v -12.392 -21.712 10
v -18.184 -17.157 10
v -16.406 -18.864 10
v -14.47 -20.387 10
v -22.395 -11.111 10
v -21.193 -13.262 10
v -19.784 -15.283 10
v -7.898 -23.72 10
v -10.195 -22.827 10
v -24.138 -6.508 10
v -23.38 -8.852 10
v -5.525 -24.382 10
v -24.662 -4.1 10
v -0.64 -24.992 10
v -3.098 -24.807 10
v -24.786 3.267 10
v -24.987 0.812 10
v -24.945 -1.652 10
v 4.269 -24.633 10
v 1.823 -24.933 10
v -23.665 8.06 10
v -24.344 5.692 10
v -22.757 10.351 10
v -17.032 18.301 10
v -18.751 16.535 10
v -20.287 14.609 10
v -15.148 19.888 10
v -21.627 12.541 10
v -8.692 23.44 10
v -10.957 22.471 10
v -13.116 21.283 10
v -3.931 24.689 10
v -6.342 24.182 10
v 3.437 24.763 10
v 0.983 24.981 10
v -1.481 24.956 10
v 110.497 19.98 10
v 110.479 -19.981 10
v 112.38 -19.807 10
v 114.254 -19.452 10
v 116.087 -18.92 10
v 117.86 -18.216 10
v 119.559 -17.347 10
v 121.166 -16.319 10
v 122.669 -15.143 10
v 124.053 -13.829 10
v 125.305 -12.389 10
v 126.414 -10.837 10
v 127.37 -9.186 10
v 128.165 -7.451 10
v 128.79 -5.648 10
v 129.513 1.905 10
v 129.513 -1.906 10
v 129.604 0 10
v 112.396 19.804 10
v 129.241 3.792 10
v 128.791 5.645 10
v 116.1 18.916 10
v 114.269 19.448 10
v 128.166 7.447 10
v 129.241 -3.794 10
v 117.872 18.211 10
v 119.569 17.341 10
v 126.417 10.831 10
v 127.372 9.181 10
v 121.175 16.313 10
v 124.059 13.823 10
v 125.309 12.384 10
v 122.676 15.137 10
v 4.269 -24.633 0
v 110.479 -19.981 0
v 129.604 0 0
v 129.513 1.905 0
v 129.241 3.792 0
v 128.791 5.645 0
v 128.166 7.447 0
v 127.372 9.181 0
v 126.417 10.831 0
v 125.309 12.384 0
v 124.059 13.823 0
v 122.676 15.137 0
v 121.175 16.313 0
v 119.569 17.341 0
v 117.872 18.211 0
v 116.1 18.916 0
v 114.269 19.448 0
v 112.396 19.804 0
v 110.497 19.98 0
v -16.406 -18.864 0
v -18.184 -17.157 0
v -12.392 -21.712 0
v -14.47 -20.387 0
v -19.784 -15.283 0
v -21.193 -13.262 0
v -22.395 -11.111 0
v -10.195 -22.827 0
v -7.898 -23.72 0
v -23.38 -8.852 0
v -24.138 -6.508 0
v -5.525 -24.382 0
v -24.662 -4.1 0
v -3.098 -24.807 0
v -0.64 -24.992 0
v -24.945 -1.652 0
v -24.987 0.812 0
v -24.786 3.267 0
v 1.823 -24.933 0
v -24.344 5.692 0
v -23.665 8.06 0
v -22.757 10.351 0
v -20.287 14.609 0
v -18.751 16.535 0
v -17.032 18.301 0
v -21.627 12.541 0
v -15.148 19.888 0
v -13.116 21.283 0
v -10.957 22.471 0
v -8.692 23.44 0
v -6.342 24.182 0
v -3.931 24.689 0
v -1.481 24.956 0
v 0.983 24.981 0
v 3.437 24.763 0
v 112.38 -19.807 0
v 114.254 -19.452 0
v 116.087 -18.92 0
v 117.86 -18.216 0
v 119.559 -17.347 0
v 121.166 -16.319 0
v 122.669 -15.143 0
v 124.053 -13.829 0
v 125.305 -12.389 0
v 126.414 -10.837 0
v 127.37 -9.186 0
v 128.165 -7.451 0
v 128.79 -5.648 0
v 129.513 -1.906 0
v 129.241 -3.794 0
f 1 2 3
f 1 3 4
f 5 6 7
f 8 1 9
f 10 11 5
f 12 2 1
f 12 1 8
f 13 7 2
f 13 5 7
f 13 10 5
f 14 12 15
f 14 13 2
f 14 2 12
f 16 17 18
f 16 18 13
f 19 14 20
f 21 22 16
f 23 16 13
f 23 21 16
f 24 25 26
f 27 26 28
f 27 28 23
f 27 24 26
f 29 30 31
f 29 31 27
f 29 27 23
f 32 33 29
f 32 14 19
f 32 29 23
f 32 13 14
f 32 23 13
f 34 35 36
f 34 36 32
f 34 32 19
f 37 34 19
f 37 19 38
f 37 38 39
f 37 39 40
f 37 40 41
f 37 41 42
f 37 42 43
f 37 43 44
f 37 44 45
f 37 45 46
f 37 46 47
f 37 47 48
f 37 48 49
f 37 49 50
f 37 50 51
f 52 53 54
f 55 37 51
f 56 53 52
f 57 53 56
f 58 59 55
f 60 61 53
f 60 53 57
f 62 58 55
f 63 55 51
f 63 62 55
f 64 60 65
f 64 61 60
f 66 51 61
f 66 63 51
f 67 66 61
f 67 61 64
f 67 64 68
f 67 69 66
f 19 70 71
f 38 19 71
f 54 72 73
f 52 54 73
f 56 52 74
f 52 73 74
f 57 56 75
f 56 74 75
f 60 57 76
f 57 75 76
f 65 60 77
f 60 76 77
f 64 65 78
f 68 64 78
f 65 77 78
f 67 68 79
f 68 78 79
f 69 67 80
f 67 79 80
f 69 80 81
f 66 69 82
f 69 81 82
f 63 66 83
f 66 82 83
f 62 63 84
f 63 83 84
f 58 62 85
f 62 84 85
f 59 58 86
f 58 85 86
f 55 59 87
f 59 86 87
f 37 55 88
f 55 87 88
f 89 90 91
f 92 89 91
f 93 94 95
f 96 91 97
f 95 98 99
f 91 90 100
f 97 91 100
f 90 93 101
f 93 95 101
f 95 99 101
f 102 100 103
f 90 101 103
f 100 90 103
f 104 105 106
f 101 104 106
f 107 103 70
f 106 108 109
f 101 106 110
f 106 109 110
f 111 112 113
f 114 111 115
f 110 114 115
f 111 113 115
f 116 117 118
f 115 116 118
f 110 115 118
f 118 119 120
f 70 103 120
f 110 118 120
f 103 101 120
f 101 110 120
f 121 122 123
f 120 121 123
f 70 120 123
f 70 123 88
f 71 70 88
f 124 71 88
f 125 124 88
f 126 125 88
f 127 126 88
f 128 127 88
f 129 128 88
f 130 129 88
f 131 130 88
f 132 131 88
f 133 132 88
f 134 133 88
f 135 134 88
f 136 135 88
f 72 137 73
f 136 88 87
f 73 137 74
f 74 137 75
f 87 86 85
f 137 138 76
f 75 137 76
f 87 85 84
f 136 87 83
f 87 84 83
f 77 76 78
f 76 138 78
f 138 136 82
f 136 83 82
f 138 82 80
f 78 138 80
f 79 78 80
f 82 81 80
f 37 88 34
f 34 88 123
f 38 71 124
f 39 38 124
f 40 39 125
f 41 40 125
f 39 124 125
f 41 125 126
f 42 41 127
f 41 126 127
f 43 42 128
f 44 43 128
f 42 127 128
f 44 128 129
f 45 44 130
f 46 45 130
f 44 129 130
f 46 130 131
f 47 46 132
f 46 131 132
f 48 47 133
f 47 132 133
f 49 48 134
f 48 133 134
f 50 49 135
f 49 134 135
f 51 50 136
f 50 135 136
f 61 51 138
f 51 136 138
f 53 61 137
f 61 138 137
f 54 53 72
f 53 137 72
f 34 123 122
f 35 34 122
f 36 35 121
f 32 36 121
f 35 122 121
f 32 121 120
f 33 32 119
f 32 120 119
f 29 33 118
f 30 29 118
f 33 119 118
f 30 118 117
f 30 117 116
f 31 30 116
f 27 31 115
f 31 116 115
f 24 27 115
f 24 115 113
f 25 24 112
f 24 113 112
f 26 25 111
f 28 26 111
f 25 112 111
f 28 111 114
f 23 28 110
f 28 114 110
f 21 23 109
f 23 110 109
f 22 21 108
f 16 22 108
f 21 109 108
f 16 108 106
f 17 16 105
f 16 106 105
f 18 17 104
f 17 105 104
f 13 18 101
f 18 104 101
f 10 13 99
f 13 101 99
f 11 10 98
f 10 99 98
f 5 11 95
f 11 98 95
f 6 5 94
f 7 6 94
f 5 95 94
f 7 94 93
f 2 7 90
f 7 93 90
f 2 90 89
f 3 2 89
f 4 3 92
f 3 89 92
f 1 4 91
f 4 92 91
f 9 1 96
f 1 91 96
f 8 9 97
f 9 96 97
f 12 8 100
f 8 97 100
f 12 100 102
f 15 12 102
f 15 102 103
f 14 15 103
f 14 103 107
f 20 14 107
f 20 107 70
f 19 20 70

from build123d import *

# Parameters (mm, degrees)
F1_DEPTH = 10


# Not quite as in the source:
# - the program builds the solid bodies; features that only make, move or delete a surface that nothing else refers to are left out


with BuildPart() as f1:
    # F0 (on Top) → F1 (new body)
    with BuildSketch(Plane.XY):
        with BuildLine():
            ThreePointArc((4.2686762947, -24.6328724003), (19.1274267397, -16.0978739688), (25, 0))
            ThreePointArc((25, 0), (18.8537485405, 16.4175566383), (3.4371067222, 24.7625987606))
            ThreePointArc((3.4371067222, 24.7625987606), (-24.9964580647, -0.42081376), (4.2686762947, -24.6328724003))
        make_face()
        with BuildLine():
            ThreePointArc((110.4968080295, 19.9800743296), (95.7812936366, 14.4542523825), (89.6042668357, 0))
            ThreePointArc((89.6042668357, 0), (95.7750082208, -14.4482388602), (110.4794274519, -19.9808431728))
            ThreePointArc((110.4794274519, -19.9808431728), (124.0525056959, -13.8292586149), (129.6042668357, 0))
            ThreePointArc((129.6042668357, 0), (124.0585192182, 13.8229731991), (110.4968080295, 19.9800743296))
        make_face()
        with BuildLine():
            Line((89.6042668357, 0), (25, 0))
            ThreePointArc((25, 0), (19.1274267397, -16.0978739688), (4.2686762947, -24.6328724003))
            Line((4.2686762947, -24.6328724003), (110.4794274519, -19.9808431728))
            ThreePointArc((110.4794274519, -19.9808431728), (95.7750082208, -14.4482388602), (89.6042668357, 0))
        make_face()
        with BuildLine():
            ThreePointArc((3.4371067222, 24.7625987606), (18.8537485405, 16.4175566383), (25, 0))
            Line((25, 0), (89.6042668357, 0))
            ThreePointArc((89.6042668357, 0), (95.7812936366, 14.4542523825), (110.4968080295, 19.9800743296))
            Line((110.4968080295, 19.9800743296), (3.4371067222, 24.7625987606))
        make_face()
    extrude(amount=F1_DEPTH)


solid = f1.part
